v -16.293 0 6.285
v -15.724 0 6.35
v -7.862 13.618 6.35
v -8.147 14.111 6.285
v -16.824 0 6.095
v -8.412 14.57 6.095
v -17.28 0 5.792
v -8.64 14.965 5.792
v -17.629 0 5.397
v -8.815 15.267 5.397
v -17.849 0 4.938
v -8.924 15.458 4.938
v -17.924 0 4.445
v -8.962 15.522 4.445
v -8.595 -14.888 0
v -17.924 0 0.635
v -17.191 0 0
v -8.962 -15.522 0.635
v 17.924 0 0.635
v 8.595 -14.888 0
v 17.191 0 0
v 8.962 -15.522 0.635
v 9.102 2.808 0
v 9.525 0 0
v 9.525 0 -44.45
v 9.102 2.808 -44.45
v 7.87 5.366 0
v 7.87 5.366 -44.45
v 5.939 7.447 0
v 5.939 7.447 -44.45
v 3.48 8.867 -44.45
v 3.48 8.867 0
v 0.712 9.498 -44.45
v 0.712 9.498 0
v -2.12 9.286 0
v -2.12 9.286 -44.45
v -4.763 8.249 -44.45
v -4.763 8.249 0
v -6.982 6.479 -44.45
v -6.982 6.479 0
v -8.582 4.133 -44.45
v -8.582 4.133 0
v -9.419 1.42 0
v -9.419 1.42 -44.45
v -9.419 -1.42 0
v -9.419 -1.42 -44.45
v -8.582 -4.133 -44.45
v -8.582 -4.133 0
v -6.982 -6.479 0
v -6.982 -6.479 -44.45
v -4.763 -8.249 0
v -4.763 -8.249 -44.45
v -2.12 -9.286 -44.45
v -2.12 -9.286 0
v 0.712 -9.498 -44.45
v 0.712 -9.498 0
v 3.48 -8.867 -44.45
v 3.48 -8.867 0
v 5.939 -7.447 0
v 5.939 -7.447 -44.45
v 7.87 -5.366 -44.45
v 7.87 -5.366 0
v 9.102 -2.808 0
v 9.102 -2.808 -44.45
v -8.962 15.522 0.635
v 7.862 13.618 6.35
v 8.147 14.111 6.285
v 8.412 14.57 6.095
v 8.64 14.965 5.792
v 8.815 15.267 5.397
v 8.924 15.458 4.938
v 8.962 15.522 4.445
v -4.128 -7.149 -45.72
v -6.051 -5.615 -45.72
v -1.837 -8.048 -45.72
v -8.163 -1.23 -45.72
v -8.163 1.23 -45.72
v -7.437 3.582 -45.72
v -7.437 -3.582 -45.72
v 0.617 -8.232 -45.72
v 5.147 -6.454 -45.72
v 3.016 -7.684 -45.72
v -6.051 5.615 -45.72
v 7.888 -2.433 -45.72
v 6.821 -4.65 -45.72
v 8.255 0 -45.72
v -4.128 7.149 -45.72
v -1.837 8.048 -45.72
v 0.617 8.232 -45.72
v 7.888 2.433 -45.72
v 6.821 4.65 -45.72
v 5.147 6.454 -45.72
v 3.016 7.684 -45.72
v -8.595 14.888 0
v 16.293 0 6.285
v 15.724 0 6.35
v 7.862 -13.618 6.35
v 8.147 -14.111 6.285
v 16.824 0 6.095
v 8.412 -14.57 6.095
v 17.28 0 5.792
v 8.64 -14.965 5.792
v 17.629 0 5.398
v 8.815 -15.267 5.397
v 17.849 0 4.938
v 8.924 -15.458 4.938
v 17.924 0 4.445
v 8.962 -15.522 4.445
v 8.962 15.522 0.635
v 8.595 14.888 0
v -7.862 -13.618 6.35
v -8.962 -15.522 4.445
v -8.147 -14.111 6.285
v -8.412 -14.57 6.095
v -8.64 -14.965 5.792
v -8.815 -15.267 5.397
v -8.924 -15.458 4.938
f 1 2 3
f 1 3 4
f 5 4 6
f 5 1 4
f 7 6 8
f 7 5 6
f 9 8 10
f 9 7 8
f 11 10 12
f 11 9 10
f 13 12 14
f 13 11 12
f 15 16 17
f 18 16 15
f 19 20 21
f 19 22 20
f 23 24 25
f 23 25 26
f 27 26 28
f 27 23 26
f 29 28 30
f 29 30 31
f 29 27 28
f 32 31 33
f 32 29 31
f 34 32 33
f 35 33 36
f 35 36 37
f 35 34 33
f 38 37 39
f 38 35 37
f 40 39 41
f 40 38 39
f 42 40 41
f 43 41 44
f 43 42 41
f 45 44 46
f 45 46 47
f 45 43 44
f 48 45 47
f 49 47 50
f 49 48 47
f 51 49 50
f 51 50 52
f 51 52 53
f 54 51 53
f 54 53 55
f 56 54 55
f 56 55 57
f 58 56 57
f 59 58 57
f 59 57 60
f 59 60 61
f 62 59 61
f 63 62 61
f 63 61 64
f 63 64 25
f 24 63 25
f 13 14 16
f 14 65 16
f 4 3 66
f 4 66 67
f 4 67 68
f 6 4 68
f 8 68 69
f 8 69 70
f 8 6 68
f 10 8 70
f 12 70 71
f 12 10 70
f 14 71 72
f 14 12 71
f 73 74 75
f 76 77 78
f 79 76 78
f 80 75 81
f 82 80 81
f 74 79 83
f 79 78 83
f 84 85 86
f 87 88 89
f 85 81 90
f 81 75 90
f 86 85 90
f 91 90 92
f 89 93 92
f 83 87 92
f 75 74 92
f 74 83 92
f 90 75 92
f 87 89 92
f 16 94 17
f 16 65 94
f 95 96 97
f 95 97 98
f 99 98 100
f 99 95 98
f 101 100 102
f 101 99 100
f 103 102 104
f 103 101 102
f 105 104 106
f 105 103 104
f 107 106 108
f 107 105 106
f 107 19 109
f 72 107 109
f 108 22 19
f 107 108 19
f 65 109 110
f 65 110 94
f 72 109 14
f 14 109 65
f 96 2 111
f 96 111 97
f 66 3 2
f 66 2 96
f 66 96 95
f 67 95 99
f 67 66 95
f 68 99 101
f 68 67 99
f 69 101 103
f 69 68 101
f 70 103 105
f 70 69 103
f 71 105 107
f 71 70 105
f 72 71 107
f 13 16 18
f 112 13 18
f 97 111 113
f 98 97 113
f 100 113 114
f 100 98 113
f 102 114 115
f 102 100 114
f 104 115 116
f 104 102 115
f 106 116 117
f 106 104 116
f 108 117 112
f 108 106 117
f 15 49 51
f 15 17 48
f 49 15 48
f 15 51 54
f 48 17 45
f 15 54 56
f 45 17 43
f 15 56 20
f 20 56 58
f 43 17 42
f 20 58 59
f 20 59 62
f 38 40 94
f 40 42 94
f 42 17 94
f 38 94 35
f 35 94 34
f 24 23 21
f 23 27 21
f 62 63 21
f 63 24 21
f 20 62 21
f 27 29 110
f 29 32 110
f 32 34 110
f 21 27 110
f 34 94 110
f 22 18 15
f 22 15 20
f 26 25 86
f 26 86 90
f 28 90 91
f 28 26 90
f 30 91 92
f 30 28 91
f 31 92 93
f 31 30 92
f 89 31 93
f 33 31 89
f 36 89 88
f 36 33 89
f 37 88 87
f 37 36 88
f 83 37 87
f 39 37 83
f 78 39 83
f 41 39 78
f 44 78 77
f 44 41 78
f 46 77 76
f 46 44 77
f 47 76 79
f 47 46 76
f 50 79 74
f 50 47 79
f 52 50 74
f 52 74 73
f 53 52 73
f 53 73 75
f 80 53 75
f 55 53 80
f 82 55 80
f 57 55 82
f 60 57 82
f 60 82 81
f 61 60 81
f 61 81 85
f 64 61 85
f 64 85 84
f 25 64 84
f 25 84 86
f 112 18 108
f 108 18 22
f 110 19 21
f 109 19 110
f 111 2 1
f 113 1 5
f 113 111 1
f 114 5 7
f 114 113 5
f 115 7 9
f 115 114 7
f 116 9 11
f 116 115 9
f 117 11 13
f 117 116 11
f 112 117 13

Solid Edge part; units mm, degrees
sketch "Sketch1" plane through (0, 0, 0) normal (0, 0, 1) x (1, 0, 0)
  circle A0 centre (0, 0) radius 9.525
extrude "Protrusion1" add sketch "Sketch1" against normal blind 45.72
sketch "Sketch2" plane through (0, 0, 0) normal (0, 0, 1) x (1, 0, 0)
  line L0 (8.9619, -15.5225) -> (17.9238, 0)
  line L1 (17.9238, 0) -> (8.9619, 15.5225)
  line L2 (8.9619, 15.5225) -> (-8.9619, 15.5225)
  line L3 (-8.9619, 15.5225) -> (-17.9238, 0)
  line L4 (-17.9238, 0) -> (-8.9619, -15.5225)
  line L5 (-8.9619, -15.5225) -> (8.9619, -15.5225)
extrude "ExtrudedProtrusion_2" add sketch "Sketch2" along normal blind 6.35
fillet "Round_1" radius 1.905 6 edges at (13.4429, -7.7612, 6.35) (0, -15.5225, 6.35) (-13.4429, -7.7612, 6.35) (-13.4429, 7.7612, 6.35) (0, 15.5225, 6.35) (13.4429, 7.7612, 6.35)
chamfer "Chamfer_1" distance 1.27 angle 45 1 edges at (-9.525, 0, -45.72)
chamfer "Chamfer_2" distance 0.635 angle 45 6 edges at (-13.4429, -7.7612, 0) (-13.4429, 7.7612, 0) (0, 15.5225, 0) (13.4429, 7.7612, 0) (13.4429, -7.7612, 0) (0, -15.5225, 0)
